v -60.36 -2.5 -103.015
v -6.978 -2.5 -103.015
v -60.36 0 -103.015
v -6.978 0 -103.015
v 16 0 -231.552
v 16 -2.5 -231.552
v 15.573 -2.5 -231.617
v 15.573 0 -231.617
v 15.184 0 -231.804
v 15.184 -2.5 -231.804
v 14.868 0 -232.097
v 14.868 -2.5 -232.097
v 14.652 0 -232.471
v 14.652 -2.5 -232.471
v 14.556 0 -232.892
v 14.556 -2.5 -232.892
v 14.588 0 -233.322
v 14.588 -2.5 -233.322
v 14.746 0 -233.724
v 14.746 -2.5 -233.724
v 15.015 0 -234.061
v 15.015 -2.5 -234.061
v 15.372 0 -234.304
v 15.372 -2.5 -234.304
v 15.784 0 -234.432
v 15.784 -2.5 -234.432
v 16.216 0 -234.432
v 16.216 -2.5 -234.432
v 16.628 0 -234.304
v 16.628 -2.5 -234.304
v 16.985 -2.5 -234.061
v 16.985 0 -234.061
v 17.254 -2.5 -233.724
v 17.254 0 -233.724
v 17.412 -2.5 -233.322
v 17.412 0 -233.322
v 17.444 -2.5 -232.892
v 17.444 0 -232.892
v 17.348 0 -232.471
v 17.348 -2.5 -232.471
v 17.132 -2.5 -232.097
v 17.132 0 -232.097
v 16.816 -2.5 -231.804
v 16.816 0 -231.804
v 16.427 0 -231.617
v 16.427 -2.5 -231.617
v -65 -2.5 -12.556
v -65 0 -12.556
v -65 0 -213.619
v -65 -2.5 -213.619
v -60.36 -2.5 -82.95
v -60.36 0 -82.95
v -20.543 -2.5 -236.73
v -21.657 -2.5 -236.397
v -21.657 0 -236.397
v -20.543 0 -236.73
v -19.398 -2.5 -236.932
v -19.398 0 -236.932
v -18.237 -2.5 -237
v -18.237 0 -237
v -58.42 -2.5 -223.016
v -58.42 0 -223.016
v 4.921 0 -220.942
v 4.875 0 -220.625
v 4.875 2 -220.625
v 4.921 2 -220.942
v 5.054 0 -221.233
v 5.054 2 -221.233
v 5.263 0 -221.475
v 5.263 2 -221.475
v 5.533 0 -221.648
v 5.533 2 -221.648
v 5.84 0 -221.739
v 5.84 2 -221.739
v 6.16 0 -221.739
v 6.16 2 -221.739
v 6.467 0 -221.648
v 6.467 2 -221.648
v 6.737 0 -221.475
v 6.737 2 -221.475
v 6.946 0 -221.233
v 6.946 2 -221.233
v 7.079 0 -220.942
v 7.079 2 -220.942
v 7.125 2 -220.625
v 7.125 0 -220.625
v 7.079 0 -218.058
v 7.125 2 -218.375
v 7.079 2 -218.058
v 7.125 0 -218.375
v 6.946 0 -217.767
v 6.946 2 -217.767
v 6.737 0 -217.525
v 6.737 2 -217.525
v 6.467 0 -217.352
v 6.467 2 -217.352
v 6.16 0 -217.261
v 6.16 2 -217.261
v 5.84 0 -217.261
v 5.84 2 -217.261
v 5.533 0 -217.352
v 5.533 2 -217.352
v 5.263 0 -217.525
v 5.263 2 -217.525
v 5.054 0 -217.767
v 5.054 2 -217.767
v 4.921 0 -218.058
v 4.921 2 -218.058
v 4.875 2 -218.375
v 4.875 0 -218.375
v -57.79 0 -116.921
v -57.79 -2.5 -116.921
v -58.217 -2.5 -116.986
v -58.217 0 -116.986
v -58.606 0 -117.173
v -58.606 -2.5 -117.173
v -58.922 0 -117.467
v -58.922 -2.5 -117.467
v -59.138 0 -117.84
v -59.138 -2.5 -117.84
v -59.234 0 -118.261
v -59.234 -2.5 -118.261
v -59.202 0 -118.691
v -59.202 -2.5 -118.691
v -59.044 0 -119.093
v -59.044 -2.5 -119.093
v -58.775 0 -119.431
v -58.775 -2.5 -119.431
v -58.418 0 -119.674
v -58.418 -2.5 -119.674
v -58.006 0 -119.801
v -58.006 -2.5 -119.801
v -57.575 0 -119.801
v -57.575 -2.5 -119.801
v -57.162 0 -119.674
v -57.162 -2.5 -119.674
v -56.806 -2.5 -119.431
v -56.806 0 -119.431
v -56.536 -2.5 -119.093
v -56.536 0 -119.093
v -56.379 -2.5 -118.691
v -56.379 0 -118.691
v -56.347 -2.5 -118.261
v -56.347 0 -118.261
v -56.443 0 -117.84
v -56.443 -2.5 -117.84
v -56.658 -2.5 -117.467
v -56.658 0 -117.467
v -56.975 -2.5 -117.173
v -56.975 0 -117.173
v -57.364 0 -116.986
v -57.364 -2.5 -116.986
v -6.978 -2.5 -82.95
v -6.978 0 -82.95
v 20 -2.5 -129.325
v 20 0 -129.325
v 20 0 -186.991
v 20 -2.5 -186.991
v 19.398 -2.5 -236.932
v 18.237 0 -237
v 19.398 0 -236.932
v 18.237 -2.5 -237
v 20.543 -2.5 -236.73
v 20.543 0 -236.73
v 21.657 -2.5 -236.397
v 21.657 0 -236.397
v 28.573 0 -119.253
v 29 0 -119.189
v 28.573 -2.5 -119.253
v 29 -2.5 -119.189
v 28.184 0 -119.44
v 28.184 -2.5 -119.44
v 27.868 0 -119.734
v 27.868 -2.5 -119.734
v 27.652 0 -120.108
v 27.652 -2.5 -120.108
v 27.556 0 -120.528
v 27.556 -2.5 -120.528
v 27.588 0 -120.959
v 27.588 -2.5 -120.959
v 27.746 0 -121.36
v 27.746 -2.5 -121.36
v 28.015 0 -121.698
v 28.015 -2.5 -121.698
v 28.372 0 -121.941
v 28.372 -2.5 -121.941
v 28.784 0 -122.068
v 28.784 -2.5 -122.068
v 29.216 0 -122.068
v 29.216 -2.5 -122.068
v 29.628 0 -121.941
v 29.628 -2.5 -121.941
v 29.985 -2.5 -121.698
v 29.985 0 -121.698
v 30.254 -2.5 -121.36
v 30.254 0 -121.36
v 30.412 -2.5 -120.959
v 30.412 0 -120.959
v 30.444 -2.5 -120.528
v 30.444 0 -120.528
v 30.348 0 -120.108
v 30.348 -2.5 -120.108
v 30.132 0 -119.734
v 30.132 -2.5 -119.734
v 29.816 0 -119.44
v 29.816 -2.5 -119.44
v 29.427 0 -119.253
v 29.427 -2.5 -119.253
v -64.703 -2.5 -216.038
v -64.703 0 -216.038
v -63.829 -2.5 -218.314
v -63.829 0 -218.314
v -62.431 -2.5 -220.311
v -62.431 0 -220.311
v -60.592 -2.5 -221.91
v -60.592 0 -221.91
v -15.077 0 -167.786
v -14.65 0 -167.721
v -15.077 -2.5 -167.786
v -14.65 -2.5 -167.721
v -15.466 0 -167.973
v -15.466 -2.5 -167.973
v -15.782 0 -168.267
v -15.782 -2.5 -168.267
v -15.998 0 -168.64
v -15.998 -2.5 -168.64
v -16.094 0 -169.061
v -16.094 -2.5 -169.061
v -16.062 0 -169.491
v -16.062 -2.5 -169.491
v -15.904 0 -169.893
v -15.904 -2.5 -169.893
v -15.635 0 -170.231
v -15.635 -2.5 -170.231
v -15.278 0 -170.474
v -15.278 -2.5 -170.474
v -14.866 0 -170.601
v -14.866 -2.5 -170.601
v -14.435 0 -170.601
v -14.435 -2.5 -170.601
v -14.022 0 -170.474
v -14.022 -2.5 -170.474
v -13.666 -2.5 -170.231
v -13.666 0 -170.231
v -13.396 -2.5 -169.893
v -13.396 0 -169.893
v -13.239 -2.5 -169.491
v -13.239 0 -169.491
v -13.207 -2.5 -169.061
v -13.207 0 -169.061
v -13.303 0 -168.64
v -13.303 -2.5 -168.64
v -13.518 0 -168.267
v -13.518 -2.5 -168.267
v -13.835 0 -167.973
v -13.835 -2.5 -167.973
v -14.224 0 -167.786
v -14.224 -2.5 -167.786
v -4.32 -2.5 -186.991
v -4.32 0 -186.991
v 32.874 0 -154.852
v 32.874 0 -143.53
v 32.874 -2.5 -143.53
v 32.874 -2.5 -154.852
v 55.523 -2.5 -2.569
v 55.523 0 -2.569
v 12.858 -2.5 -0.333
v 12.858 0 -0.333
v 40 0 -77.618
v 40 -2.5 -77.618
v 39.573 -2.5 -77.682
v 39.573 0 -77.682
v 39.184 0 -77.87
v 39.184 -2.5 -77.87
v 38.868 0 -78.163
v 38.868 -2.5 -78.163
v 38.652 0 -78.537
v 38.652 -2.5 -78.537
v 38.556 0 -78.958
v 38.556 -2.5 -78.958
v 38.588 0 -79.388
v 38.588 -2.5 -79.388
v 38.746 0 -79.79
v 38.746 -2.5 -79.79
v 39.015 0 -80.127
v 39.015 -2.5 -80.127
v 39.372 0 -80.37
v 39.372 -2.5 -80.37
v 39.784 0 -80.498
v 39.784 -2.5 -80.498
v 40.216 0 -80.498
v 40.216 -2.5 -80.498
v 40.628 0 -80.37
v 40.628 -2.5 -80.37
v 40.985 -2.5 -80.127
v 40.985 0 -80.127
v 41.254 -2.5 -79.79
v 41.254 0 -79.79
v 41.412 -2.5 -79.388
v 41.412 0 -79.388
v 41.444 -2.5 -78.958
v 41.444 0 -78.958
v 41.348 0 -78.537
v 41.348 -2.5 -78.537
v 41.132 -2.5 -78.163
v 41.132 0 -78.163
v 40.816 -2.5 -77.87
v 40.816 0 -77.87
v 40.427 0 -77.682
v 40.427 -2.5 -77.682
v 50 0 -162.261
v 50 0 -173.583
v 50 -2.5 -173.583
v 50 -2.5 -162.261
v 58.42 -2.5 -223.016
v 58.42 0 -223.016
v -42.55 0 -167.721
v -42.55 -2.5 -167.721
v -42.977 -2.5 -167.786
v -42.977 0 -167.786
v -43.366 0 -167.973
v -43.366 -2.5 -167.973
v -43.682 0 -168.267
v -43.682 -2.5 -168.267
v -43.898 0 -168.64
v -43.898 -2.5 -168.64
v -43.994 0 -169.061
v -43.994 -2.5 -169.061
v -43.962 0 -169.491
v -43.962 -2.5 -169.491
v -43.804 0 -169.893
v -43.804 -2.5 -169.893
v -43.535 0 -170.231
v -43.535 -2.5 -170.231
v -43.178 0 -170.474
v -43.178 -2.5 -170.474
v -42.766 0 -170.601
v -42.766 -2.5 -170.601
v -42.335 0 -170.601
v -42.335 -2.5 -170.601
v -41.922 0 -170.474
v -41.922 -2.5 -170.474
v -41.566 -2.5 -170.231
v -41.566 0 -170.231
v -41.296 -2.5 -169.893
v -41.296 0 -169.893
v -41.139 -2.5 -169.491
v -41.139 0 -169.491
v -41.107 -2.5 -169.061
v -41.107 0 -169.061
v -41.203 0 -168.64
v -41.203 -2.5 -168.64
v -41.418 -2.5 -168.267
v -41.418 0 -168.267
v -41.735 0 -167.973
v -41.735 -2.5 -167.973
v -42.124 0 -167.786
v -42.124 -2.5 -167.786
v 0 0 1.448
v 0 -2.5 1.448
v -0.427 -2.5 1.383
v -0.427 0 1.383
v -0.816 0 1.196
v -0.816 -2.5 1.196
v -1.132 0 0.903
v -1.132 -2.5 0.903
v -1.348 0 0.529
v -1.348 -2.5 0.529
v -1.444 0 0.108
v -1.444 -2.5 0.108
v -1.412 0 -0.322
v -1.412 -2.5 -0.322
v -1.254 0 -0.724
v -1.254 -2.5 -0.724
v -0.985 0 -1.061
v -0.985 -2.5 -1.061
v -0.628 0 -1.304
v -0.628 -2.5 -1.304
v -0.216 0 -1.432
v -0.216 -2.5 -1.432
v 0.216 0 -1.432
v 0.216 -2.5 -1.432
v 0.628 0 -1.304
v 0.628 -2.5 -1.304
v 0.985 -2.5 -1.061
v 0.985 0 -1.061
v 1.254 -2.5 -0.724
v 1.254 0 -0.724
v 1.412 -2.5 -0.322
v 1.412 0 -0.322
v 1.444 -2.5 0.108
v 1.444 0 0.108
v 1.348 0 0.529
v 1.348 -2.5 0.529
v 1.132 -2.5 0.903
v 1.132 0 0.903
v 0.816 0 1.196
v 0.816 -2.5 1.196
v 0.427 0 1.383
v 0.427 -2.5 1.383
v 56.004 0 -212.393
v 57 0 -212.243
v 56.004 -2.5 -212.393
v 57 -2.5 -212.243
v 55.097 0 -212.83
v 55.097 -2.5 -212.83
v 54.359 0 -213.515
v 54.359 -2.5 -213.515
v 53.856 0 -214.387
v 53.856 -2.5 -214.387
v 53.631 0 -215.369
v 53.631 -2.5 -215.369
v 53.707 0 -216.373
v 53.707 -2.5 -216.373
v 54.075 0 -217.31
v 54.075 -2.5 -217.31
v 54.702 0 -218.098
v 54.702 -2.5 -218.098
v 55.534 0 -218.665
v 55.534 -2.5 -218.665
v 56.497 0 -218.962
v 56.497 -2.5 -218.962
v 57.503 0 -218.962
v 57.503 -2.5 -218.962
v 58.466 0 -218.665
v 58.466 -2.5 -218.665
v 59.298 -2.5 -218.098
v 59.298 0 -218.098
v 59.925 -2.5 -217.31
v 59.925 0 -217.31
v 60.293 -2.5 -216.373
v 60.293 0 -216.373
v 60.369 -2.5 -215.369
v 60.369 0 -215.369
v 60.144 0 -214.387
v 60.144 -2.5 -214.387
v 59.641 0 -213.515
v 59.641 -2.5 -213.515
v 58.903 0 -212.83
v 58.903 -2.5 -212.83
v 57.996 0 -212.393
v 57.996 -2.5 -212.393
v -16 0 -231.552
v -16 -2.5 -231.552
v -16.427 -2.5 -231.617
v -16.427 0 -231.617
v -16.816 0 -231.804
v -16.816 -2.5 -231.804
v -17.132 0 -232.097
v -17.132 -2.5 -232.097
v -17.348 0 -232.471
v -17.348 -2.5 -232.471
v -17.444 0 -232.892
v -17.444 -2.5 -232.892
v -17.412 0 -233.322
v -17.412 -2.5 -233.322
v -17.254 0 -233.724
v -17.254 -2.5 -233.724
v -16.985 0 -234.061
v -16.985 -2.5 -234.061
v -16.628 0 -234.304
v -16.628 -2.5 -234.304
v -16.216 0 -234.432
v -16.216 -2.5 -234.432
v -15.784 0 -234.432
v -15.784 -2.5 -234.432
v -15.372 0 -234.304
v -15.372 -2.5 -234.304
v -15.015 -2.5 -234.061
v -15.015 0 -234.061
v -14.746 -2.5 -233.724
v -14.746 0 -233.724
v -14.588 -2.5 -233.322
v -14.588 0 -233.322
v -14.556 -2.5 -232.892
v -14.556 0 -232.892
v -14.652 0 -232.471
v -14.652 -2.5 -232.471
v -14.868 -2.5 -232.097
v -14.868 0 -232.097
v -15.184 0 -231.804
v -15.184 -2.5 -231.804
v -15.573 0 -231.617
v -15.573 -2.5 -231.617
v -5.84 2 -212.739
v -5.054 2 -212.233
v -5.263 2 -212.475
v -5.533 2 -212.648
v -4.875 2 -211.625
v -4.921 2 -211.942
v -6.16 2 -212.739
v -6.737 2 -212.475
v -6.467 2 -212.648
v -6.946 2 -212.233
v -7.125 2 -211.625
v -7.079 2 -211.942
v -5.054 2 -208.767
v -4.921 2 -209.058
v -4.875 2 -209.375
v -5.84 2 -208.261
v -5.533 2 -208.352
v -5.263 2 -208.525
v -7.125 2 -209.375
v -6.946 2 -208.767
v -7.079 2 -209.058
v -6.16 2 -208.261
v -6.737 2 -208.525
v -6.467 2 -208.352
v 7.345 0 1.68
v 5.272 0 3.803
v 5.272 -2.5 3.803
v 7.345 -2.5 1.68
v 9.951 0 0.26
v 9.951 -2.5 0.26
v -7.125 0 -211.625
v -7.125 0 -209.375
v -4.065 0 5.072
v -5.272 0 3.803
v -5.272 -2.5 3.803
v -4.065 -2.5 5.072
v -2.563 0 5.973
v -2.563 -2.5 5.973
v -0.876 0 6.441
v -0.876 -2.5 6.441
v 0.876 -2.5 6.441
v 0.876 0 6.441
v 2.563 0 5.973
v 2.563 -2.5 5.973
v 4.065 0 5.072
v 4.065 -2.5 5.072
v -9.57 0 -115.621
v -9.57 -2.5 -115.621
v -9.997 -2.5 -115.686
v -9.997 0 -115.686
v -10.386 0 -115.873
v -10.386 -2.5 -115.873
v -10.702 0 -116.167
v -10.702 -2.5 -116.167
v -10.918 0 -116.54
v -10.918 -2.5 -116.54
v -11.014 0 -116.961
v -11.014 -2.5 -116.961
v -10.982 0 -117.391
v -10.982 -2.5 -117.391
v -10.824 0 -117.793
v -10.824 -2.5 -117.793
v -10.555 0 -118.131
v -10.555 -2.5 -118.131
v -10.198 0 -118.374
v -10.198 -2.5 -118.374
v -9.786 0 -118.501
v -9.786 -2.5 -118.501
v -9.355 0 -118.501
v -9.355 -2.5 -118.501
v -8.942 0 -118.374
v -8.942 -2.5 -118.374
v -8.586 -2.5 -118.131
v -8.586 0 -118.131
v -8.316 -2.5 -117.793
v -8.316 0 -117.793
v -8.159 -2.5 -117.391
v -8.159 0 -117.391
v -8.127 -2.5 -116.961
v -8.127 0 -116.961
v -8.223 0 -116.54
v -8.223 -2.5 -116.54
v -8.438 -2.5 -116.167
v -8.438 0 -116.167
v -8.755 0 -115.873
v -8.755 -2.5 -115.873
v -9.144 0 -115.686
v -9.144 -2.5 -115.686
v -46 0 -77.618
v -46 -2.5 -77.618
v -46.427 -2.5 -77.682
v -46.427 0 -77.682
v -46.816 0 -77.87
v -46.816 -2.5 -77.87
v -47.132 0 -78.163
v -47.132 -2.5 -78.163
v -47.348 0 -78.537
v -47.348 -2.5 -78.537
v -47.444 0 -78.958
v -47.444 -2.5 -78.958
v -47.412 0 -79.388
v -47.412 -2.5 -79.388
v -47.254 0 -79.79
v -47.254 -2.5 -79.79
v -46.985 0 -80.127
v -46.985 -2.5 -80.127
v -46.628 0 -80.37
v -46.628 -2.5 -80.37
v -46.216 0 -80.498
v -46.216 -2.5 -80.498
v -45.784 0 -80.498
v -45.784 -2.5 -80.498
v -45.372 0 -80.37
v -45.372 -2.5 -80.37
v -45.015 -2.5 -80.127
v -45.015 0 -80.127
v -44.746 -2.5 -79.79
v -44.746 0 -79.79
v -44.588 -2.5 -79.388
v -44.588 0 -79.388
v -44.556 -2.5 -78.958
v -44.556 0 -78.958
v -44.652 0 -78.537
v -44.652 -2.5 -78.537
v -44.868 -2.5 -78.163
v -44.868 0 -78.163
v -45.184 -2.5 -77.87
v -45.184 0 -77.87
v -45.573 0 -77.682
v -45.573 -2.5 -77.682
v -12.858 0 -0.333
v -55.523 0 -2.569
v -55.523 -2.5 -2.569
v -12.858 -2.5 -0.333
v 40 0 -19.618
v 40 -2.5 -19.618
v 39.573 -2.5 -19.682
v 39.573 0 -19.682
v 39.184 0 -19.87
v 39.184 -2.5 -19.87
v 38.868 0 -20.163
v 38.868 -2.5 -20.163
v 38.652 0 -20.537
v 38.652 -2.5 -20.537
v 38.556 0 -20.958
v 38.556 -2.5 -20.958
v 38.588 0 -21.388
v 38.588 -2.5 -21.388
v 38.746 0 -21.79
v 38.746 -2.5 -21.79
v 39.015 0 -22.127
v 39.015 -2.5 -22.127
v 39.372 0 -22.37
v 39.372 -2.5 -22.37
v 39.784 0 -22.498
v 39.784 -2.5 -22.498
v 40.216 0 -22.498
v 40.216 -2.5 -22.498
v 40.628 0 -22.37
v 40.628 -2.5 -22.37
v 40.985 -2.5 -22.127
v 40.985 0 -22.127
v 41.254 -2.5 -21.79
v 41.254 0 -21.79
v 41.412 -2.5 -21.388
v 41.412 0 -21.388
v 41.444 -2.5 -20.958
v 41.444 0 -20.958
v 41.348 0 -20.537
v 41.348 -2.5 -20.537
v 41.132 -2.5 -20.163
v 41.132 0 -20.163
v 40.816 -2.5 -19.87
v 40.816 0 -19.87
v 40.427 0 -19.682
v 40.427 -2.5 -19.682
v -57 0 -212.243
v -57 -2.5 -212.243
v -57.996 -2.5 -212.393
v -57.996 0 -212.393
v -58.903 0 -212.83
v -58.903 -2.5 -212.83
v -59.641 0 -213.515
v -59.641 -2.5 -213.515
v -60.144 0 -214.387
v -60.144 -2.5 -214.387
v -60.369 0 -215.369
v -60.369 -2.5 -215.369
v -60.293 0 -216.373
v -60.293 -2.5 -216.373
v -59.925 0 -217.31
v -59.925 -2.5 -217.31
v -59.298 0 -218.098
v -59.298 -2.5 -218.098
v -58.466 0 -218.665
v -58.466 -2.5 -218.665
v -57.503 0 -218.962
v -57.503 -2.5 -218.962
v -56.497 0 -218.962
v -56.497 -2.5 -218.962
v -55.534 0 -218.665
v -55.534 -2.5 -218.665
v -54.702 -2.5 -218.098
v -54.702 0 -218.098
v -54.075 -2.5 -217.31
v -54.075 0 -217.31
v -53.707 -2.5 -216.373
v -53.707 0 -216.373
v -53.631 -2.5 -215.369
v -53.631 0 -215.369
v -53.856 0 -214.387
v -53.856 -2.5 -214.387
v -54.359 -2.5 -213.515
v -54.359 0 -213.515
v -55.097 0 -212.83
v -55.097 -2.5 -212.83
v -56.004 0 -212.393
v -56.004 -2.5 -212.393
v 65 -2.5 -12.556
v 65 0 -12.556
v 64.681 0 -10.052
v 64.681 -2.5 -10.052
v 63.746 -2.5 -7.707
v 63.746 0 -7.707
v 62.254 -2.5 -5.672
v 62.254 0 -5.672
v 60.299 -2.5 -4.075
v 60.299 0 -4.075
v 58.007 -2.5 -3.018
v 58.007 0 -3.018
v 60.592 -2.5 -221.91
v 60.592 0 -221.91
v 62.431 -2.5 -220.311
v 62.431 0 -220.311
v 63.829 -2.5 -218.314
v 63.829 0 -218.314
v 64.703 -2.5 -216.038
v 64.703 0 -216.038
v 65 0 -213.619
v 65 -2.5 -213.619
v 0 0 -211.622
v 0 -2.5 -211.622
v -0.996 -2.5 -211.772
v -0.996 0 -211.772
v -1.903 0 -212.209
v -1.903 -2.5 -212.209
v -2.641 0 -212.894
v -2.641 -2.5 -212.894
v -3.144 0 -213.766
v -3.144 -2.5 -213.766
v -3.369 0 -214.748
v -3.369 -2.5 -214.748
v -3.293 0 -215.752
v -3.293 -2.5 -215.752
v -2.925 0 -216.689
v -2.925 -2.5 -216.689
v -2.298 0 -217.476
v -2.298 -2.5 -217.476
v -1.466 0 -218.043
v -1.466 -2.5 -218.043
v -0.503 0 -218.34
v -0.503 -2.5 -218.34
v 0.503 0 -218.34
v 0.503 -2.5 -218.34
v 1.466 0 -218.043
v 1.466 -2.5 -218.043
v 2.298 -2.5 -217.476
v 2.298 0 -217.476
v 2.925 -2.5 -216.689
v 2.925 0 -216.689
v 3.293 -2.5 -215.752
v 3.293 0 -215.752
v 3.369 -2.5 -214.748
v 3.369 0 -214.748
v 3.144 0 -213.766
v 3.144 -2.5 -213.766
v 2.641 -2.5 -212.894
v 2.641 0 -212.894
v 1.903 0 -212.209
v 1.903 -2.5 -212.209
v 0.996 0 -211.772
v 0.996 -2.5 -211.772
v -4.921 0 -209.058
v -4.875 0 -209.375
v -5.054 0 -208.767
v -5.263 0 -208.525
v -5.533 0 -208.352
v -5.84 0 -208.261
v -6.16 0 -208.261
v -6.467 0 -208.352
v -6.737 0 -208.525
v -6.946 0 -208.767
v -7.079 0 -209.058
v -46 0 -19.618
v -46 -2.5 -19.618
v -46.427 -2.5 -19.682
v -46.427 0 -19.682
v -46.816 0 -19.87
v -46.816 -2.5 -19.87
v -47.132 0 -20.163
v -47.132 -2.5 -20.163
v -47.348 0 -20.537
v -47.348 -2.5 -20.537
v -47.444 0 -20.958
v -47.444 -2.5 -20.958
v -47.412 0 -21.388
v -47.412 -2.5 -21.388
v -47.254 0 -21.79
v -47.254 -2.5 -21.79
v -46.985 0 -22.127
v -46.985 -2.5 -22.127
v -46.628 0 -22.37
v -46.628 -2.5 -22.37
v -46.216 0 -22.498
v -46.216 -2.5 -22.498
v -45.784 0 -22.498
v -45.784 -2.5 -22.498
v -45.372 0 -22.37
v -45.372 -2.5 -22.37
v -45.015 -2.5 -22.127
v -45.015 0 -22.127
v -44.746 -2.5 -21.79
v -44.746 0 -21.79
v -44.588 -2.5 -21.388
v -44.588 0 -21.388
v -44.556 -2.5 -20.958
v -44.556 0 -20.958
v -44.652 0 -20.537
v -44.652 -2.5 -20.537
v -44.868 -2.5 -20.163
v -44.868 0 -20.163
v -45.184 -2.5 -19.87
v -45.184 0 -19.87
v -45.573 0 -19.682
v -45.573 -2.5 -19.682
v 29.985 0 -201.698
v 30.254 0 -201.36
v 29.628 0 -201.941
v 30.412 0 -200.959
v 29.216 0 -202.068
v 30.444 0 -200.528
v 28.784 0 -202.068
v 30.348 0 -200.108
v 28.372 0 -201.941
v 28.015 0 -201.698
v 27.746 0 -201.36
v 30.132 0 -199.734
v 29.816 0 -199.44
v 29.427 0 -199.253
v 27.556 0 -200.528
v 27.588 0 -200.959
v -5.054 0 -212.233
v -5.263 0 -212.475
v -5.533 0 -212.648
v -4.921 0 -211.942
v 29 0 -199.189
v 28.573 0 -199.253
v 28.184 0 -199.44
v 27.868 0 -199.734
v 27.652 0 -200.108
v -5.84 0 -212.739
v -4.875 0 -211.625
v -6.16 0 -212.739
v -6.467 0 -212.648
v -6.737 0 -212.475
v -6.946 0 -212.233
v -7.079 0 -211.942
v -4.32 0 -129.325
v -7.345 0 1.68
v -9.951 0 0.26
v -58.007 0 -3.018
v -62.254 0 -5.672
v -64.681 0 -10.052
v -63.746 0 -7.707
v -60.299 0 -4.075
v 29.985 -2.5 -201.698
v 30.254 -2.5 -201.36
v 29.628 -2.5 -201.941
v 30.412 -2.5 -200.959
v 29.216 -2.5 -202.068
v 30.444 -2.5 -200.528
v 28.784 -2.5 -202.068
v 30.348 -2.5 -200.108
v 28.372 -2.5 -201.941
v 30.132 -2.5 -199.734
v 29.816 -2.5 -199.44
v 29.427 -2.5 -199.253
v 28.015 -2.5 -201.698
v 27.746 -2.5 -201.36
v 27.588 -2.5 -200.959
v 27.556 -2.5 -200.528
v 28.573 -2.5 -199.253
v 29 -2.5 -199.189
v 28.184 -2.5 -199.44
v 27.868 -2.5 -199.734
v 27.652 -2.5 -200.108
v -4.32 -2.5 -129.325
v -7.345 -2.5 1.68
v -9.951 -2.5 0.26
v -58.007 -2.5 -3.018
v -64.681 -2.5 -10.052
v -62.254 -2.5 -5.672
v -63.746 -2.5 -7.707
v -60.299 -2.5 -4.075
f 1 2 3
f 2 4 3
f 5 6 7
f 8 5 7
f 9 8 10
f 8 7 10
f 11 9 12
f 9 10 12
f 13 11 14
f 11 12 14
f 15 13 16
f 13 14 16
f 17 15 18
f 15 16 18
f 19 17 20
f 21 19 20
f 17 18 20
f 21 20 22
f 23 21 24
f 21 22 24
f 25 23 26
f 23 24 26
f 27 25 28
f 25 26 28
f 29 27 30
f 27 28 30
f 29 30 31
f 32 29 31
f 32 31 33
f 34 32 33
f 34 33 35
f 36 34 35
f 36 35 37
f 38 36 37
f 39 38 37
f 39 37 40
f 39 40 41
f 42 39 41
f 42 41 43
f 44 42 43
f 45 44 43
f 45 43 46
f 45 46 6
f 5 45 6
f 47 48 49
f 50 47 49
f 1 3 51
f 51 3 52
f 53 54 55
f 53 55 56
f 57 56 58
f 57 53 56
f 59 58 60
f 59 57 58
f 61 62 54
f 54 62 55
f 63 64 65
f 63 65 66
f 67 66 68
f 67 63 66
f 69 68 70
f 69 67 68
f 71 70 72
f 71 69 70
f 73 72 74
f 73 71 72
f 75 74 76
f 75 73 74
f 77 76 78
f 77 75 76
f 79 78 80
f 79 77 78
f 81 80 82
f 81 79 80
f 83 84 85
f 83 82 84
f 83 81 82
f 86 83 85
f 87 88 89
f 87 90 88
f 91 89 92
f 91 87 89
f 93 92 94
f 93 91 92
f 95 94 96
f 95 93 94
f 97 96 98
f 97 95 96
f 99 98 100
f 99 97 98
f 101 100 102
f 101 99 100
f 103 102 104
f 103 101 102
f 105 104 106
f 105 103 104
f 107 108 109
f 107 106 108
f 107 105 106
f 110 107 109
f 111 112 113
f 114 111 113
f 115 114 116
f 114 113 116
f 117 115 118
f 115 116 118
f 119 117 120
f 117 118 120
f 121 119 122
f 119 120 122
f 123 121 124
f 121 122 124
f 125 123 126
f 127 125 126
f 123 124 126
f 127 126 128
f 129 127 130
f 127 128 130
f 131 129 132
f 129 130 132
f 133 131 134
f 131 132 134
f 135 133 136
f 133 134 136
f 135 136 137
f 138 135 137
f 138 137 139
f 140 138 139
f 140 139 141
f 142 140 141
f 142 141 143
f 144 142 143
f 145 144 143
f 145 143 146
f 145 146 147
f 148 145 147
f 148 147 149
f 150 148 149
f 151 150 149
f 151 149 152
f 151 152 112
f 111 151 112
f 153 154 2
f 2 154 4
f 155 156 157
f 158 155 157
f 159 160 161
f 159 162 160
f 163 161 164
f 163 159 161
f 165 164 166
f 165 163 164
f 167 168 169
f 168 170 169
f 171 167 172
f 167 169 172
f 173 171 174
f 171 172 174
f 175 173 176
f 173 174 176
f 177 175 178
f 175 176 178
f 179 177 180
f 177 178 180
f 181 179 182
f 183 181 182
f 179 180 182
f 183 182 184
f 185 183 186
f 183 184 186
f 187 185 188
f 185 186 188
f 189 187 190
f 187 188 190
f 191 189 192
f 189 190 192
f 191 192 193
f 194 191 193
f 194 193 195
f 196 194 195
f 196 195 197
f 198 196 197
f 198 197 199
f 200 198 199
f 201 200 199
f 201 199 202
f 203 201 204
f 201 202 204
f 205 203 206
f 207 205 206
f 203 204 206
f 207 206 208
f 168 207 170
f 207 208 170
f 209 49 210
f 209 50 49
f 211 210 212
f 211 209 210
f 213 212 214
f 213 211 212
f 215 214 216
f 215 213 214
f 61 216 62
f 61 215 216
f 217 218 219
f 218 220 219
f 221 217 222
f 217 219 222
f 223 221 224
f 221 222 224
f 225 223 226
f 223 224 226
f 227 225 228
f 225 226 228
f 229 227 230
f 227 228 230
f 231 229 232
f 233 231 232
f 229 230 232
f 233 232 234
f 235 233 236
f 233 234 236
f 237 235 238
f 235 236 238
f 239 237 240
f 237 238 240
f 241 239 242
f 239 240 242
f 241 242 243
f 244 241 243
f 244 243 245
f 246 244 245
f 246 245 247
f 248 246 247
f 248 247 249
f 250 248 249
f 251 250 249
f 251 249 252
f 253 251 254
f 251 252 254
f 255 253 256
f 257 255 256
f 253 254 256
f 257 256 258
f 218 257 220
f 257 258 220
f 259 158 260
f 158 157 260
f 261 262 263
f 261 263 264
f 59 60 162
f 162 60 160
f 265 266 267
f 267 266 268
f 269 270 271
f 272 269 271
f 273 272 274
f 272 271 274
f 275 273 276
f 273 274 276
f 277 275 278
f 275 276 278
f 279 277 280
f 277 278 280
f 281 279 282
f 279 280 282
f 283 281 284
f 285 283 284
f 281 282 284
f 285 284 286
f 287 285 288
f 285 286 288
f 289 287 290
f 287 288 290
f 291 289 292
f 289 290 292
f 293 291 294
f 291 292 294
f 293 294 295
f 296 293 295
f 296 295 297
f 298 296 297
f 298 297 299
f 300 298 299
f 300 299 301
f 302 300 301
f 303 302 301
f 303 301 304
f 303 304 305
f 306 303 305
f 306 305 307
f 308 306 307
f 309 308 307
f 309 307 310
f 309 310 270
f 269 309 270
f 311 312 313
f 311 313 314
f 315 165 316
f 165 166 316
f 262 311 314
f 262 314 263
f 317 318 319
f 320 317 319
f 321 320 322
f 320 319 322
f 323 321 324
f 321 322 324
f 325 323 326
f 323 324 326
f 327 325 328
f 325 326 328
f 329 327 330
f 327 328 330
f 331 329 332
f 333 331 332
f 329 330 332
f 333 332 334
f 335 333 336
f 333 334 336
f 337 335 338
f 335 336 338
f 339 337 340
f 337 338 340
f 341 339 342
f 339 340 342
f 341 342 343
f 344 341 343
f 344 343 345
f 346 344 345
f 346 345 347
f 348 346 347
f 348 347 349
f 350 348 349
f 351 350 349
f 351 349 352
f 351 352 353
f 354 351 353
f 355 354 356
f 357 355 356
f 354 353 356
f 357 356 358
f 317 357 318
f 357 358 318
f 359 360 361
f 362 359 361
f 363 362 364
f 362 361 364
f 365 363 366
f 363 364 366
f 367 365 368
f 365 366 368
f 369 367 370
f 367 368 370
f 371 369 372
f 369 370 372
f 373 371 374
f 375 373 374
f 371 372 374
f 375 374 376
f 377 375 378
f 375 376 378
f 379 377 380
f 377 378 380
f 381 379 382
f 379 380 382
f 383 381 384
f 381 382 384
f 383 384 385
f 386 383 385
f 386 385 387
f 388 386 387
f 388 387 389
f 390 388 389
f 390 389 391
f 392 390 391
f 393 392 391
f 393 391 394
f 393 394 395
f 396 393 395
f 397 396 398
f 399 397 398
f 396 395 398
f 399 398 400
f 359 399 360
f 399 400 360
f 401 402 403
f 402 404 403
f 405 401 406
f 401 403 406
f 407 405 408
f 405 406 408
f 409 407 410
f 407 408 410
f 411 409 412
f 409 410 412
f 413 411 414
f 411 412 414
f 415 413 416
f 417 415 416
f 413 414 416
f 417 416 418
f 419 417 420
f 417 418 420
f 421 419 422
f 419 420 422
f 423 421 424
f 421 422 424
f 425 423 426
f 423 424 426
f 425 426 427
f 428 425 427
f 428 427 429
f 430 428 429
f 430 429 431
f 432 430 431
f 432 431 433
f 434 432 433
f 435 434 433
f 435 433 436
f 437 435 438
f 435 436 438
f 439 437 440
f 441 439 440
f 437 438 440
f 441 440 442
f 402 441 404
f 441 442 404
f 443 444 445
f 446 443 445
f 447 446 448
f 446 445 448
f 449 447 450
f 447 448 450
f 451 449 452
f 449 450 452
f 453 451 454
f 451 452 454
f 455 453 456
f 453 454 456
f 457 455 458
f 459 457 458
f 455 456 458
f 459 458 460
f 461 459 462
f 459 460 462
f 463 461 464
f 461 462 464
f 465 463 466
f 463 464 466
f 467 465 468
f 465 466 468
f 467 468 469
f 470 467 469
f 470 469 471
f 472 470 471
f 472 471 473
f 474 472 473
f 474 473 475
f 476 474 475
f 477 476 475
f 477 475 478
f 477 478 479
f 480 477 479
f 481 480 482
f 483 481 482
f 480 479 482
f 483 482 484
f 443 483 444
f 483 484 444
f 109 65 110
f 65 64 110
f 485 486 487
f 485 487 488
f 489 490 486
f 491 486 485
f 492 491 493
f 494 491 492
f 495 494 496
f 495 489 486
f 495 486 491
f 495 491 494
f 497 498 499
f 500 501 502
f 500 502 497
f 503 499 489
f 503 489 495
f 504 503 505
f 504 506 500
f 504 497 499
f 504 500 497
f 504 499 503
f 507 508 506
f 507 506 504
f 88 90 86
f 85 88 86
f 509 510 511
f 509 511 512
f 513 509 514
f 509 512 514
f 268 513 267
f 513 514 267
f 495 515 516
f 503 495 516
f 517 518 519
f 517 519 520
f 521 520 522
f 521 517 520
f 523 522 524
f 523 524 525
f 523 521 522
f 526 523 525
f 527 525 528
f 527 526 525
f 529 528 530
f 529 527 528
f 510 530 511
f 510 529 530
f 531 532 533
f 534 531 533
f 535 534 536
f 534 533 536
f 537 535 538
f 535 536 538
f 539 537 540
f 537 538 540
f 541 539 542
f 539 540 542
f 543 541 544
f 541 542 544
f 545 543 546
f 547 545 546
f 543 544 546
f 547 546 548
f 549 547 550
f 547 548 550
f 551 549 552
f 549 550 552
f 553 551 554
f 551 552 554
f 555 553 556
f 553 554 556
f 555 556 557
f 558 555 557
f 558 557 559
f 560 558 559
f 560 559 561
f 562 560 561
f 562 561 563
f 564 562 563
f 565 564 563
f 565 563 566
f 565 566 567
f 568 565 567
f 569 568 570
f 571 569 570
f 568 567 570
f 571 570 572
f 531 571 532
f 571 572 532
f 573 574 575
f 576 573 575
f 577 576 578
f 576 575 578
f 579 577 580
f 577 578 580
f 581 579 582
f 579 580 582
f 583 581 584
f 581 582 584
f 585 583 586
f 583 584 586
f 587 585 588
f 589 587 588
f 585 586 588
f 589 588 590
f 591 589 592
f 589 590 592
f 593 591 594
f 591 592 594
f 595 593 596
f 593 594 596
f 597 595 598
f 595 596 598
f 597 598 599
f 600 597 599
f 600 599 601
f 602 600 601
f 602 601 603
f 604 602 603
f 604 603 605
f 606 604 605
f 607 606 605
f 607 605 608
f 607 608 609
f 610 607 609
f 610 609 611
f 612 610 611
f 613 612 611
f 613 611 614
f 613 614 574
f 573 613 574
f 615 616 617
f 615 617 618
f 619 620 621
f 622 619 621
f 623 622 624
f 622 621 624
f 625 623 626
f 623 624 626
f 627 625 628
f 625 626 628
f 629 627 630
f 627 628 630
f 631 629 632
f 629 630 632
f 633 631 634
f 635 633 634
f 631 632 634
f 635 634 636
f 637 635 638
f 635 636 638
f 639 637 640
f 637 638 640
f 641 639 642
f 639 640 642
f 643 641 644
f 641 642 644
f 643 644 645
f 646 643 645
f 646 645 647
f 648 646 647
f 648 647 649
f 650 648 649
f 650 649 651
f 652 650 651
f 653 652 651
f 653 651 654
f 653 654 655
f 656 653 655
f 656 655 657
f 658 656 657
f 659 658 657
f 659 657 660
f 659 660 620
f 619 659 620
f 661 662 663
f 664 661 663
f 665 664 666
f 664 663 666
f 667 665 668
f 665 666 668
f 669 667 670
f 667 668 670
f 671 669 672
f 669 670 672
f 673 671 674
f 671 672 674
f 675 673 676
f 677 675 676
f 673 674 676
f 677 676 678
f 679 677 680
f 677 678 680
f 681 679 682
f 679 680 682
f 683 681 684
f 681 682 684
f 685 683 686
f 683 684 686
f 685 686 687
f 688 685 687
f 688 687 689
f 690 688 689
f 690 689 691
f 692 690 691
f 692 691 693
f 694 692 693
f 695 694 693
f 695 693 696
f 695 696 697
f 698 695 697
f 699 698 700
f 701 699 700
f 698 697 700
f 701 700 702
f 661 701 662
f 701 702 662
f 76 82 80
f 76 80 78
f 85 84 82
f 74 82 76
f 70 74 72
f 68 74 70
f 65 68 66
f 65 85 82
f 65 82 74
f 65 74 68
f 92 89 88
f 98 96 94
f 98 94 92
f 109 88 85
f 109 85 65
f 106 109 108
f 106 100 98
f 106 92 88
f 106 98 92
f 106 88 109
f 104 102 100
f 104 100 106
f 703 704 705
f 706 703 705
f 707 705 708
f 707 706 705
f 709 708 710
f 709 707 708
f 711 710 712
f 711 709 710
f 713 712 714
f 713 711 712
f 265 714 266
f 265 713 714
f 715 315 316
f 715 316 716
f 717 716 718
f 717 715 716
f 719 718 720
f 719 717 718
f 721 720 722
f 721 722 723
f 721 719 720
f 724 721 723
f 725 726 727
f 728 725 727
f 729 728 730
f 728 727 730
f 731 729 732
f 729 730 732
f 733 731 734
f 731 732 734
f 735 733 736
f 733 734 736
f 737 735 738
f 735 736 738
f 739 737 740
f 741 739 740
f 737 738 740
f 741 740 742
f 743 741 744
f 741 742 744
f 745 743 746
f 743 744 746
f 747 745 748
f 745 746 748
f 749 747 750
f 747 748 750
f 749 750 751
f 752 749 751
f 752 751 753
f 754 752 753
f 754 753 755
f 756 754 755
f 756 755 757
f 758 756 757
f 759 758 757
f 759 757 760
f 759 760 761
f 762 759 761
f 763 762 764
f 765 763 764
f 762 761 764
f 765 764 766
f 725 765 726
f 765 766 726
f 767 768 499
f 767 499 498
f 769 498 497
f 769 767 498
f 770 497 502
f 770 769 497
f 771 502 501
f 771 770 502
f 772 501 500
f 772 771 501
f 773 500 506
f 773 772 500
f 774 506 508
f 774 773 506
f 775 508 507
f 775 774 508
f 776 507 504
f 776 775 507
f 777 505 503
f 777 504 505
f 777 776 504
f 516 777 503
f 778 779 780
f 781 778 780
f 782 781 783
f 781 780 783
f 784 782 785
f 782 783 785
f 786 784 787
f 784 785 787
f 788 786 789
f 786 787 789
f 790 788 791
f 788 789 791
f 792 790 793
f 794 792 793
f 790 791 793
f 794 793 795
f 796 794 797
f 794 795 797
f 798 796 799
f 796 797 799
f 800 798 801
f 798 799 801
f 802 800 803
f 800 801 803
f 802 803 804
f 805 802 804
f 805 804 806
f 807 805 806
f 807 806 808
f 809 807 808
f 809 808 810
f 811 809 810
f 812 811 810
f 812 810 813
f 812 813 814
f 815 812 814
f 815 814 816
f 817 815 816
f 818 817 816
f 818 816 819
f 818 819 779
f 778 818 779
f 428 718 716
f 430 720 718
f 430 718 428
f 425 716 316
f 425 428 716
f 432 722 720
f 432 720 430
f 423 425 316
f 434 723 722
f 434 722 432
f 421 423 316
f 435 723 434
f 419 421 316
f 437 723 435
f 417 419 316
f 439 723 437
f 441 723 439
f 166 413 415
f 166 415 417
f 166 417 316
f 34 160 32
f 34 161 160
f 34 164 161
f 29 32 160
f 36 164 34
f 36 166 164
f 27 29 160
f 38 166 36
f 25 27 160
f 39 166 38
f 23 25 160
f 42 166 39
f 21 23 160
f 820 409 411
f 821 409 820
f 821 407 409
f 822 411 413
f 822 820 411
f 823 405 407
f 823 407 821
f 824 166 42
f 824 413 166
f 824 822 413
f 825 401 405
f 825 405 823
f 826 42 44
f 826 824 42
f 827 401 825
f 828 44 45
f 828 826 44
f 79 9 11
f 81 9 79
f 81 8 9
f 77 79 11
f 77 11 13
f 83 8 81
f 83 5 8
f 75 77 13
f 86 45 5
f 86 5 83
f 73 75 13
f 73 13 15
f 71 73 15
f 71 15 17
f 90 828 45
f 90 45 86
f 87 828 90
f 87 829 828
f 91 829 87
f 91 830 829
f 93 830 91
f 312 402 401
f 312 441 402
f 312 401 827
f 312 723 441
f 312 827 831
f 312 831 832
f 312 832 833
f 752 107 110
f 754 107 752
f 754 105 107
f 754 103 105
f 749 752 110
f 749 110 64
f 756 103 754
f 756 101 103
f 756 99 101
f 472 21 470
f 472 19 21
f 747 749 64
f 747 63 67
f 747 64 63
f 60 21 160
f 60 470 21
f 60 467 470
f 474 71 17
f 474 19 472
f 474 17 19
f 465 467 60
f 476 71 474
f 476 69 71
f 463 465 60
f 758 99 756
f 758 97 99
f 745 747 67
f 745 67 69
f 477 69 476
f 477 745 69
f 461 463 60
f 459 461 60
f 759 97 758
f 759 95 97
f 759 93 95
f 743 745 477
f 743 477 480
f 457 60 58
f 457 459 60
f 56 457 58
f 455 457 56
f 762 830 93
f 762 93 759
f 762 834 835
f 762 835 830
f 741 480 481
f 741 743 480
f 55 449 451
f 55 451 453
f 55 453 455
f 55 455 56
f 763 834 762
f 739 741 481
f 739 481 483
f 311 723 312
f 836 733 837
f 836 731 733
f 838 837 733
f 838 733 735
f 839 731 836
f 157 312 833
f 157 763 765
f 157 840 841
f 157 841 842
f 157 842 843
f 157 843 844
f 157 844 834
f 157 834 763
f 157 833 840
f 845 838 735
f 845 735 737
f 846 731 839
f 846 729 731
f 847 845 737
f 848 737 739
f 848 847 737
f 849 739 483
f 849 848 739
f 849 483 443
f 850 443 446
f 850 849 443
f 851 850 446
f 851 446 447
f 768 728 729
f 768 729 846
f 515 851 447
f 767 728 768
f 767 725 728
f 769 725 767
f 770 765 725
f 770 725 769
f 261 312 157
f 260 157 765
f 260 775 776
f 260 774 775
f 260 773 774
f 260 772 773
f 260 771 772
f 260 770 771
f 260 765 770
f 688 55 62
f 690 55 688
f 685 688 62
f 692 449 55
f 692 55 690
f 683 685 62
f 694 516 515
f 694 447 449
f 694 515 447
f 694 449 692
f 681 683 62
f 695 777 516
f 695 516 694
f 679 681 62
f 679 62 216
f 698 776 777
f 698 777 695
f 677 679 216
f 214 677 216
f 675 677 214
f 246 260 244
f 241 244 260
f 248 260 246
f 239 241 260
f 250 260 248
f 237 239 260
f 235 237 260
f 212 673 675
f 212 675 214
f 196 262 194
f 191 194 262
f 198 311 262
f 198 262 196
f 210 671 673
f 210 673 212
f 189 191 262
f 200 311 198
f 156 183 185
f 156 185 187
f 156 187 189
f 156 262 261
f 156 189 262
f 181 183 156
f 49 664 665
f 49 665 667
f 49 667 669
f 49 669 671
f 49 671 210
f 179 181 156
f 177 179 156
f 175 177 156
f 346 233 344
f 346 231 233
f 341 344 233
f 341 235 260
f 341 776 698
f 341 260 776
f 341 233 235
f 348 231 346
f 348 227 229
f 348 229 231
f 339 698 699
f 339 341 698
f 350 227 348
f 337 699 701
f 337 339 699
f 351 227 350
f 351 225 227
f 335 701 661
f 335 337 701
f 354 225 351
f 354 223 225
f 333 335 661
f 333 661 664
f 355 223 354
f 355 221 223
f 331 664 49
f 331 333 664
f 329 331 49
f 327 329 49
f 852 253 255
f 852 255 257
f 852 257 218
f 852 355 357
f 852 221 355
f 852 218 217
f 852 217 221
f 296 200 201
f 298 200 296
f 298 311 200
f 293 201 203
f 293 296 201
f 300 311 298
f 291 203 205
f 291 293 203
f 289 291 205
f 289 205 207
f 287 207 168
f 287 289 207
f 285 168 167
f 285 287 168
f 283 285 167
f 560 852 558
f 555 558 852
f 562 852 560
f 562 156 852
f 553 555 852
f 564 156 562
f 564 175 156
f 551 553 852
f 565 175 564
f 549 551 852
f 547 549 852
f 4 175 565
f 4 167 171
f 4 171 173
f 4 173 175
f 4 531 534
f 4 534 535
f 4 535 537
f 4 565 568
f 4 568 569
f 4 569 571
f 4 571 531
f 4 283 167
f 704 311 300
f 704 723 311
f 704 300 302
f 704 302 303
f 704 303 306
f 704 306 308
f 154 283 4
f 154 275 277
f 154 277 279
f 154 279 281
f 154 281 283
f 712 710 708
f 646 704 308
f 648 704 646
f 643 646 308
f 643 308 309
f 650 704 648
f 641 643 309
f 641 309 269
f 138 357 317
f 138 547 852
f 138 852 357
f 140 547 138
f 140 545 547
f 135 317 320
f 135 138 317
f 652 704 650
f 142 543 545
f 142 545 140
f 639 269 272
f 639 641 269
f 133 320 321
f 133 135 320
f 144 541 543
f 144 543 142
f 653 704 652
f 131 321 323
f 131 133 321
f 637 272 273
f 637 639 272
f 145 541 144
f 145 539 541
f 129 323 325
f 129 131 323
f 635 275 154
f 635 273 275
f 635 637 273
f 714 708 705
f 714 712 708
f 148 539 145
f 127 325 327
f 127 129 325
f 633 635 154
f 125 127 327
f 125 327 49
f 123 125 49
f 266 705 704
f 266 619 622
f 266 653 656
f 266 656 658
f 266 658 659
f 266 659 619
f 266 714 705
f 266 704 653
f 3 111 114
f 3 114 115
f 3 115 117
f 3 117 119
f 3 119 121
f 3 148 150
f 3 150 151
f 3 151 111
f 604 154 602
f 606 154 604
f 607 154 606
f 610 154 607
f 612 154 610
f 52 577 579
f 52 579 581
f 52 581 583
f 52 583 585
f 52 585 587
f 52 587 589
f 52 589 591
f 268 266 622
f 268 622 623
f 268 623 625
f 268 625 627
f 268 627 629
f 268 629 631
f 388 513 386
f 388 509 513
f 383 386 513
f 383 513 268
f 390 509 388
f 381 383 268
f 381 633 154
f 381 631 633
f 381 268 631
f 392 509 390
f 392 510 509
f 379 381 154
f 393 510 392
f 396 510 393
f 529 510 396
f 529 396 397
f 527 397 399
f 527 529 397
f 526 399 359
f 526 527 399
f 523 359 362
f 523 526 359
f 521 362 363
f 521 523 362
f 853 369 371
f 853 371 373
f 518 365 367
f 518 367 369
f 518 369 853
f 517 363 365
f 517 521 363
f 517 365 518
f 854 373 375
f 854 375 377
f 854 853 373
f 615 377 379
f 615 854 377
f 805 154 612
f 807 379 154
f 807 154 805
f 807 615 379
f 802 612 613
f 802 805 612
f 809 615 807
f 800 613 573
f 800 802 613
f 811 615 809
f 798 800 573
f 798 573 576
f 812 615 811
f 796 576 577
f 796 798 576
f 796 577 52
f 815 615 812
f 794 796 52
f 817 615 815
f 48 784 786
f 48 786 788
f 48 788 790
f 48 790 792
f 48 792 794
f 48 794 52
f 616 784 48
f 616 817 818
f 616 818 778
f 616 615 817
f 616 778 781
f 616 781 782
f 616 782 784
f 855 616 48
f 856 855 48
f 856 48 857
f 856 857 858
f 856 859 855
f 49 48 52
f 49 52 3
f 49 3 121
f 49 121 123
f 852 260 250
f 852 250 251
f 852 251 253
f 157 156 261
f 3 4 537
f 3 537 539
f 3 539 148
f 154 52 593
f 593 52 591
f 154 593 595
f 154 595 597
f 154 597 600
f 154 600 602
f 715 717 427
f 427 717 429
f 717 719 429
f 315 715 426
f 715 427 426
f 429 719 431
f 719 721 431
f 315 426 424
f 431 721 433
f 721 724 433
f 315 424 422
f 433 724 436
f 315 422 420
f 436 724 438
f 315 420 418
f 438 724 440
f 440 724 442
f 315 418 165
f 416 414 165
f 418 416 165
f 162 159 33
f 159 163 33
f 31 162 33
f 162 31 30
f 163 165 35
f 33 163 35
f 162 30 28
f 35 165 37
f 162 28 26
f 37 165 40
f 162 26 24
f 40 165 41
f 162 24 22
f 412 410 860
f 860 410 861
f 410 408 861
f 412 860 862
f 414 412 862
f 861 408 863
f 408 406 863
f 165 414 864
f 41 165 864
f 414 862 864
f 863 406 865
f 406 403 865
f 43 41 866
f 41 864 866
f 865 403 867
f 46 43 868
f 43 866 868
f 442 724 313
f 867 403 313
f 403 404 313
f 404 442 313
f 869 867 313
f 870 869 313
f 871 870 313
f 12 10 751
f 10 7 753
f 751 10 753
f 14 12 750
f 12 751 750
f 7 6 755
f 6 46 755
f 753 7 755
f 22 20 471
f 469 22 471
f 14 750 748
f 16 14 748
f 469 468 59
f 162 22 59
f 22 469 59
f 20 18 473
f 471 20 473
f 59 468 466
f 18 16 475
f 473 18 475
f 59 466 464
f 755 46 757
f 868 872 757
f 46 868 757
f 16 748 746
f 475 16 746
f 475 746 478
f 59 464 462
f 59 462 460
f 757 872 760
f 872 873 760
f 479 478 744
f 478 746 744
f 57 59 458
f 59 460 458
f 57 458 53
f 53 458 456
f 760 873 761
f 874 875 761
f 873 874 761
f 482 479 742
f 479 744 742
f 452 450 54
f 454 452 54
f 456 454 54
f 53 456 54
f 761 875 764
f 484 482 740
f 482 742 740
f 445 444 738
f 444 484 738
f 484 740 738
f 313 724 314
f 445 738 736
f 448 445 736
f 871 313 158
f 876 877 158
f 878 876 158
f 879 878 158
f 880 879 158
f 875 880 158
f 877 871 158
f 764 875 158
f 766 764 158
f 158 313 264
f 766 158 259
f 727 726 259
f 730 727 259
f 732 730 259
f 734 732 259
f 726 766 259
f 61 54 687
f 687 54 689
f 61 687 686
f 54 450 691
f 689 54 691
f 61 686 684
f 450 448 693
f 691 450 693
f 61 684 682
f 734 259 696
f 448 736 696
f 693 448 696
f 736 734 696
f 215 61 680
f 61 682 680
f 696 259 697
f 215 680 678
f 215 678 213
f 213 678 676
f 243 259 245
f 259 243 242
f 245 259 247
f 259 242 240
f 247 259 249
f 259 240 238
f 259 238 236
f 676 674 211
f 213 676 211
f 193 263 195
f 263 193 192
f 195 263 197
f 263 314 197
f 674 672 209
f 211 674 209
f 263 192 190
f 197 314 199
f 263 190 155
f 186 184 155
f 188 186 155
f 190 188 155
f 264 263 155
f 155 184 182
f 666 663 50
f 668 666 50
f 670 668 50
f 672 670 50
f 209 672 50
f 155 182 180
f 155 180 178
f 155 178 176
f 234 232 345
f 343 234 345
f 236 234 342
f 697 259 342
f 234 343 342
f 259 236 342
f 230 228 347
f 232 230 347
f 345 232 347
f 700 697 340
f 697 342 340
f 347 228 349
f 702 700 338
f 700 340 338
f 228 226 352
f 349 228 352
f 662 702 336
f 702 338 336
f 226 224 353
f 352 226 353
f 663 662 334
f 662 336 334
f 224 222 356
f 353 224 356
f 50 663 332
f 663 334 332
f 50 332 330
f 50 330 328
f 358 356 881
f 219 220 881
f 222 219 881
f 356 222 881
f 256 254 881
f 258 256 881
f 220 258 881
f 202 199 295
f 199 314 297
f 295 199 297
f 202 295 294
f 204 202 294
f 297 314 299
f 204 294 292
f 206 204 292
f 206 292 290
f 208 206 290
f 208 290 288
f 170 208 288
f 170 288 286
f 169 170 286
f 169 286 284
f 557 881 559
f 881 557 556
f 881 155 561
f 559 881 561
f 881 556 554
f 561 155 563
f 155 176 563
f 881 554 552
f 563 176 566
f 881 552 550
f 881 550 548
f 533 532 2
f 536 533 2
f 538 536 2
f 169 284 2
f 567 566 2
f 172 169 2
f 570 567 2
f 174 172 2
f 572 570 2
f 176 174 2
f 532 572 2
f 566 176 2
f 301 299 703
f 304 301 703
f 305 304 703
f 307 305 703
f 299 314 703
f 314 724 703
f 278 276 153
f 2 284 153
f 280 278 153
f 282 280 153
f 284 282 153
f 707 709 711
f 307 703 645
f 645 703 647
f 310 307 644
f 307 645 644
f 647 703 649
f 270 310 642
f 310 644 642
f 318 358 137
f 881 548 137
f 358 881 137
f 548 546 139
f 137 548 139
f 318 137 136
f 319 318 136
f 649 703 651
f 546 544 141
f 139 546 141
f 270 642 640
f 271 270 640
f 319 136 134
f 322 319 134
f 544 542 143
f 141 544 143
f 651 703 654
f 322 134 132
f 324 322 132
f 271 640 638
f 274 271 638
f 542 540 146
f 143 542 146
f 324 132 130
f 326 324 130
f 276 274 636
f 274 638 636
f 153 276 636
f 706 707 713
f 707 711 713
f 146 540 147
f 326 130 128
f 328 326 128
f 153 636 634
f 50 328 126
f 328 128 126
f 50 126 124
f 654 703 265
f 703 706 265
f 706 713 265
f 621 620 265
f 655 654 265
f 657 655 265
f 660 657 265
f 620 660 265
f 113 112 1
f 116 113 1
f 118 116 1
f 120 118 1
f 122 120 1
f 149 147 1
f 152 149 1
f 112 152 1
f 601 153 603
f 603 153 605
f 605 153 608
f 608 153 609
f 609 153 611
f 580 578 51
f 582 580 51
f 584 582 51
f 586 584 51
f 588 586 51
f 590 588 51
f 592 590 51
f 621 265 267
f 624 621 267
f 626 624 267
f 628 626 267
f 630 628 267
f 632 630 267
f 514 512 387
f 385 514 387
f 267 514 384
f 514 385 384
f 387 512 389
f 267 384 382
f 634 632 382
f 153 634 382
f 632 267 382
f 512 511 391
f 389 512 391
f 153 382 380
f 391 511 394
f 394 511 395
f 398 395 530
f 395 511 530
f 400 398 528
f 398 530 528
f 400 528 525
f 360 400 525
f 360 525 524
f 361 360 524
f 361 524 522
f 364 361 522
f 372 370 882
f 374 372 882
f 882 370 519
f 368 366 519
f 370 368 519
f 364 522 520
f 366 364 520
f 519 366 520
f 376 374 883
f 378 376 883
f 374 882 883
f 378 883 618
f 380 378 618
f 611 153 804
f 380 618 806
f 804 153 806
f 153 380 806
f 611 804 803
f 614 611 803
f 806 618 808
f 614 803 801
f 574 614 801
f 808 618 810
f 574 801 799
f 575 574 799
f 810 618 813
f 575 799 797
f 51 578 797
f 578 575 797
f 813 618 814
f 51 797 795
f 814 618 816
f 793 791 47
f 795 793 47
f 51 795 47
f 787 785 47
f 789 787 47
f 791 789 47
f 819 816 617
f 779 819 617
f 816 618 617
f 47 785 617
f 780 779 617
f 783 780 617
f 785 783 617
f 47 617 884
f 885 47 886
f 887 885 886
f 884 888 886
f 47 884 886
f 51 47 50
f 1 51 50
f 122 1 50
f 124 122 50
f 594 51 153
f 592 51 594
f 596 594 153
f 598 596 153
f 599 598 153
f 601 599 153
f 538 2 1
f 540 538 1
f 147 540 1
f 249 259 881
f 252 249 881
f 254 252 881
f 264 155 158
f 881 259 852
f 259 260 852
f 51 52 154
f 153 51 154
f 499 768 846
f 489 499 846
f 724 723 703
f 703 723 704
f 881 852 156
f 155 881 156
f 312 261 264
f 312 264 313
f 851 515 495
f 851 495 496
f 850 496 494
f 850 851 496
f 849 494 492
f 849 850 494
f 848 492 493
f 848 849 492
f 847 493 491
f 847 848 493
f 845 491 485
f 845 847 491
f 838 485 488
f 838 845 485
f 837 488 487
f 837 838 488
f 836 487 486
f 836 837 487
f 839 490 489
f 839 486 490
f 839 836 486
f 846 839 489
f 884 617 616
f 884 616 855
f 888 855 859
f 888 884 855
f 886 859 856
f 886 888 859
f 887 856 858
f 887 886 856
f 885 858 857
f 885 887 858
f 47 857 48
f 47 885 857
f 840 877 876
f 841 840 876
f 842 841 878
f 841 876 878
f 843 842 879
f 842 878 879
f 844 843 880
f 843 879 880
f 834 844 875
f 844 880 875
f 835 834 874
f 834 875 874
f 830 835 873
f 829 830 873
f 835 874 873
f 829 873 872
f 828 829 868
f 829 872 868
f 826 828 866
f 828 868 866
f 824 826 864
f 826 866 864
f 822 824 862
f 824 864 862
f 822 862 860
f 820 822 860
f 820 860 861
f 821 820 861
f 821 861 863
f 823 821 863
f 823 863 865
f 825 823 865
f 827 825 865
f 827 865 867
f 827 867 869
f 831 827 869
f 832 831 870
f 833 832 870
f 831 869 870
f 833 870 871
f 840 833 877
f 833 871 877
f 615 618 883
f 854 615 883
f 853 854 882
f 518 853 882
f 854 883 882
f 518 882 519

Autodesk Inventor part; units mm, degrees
ref_plane "YZ Plane" through (0, 0, 0) normal (1, 0, 0) x (0, 1, 0)
ref_plane "XZ Plane" through (0, 0, 0) normal (0, 1, 0) x (-1, 0, 0)
ref_plane "XY Plane" through (0, 0, 0) normal (0, 0, 1) x (1, 0, 0)
sketch "Sketch2" plane through (0, 0, 0) normal (0, 1, 0) x (-1, 0, 0)
  line L0 (60, -21.0659) -> (-26, -21.0659) construction
  line L1 (-26, -21.0659) -> (-26, -79.0659) construction
  line L2 (-26, -79.0659) -> (60, -79.0659) construction
  line L3 (60, -79.0659) -> (60, -21.0659) construction
  line L4 (-41.5, -22.5659) -> (-60.5, -22.5659) construction
  line L5 (-60.5, -22.5659) -> (-60.5, -78.5659) construction
  line L6 (-60.5, -78.5659) -> (-41.5, -78.5659) construction
  line L7 (-41.5, -78.5659) -> (-41.5, -22.5659) construction
  line L8 (46, -21.0659) -> (-40, -21.0659) construction
  line L9 (-40, -21.0659) -> (-40, -79.0659) construction
  line L10 (-40, -79.0659) -> (46, -79.0659) construction
  line L11 (46, -79.0659) -> (46, -21.0659) construction
  line L12 (-29, -120.6366) -> (-29, -200.6366) construction
  line L13 (65, -3.0659) -> (65, -220.6213)
  line L14 (65, -220.6213) -> (20, -237)
  line L15 (20, -237) -> (-20, -237)
  line L16 (-20, -237) -> (-65, -220.6213)
  line L17 (-65, -220.6213) -> (-65, -3.0659)
  line L18 (65, -3.0659) -> (6.5, 0)
  line L19 (-65, -3.0659) -> (-6.5, 0)
  arc A0 (6.5, 0) -> (-6.5, 0) centre (0, 0) ccw
  line L20 (16, -233) -> (-16, -233) construction
  line L21 (6.5, 0) -> (-6.5, 0) construction
  line L22 (-32.8737, -143.5299) -> (-32.8737, -154.8521)
  line L23 (-32.8737, -154.8521) -> (-50, -173.5831)
  line L24 (-50, -173.5831) -> (-50, -162.2608)
  line L25 (-50, -162.2608) -> (-32.8737, -143.5299)
  line L26 (4.3202, -129.3254) -> (-20, -129.3254)
  line L27 (-20, -129.3254) -> (-20, -186.991)
  line L28 (-20, -186.991) -> (4.3202, -186.991)
  line L29 (4.3202, -186.991) -> (4.3202, -129.3254)
  line L30 (64, -4.0659) -> (-36, -4.0659) construction
  line L31 (-36, -4.0659) -> (-36, -83.0659) construction
  line L32 (-36, -83.0659) -> (64, -83.0659) construction
  line L33 (64, -83.0659) -> (64, -4.0659) construction
  line L34 (50, -4.0659) -> (-50, -4.0659) construction
  line L35 (-50, -4.0659) -> (-50, -83.0659) construction
  line L36 (-50, -83.0659) -> (50, -83.0659) construction
  line L37 (50, -83.0659) -> (50, -4.0659) construction
  line L38 (57, -215.6213) -> (-57, -215.6213) construction
  line L39 (42.5503, -169.1692) -> (14.6503, -169.1692) construction
  line L40 (60.3703, -103.0992) -> (7.0303, -103.0992) construction
  line L41 (7.0303, -103.0992) -> (7.0303, -204.6992) construction
  line L42 (7.0303, -204.6992) -> (60.3703, -204.6992) construction
  line L43 (60.3703, -204.6992) -> (60.3703, -103.0992) construction
  line L44 (60.3601, -82.95) -> (6.9778, -82.95)
  line L45 (6.9778, -82.95) -> (6.9778, -103.0146)
  line L46 (6.9778, -103.0146) -> (60.3601, -103.0146)
  line L47 (60.3601, -103.0146) -> (60.3601, -82.95)
  line L48 (6, -209.375) -> (6, -211.625) construction
  line L49 (4.875, -209.375) -> (4.875, -211.625)
  line L50 (7.125, -211.625) -> (7.125, -209.375)
  arc A1 (7.125, -209.375) -> (4.875, -209.375) centre (6, -209.375) ccw
  arc A2 (4.875, -211.625) -> (7.125, -211.625) centre (6, -211.625) ccw
  line L51 (-6, -218.375) -> (-6, -220.625) construction
  line L52 (-7.125, -218.375) -> (-7.125, -220.625)
  line L53 (-4.875, -220.625) -> (-4.875, -218.375)
  arc A3 (-4.875, -218.375) -> (-7.125, -218.375) centre (-6, -218.375) ccw
  arc A4 (-7.125, -220.625) -> (-4.875, -220.625) centre (-6, -220.625) ccw
  point P0 (0, -215)
  point P1 (57.7903, -118.3692)
  point P2 (9.5703, -117.0692)
  point P3 (6, -210.5)
  point P4 (-6, -219.5)
  dimension "d0" = 130
  dimension "d1" = 32
  dimension "d4" = 65
  dimension "d5" = 0
  dimension "d6" = 6.5
  dimension "d7" = 93
  dimension "d8" = 93
  dimension "d9" = 4
  dimension "d11" = 237
  dimension "d12" = 160
  dimension "d14" = 86
  dimension "d15" = 86
  dimension "d16" = 58
  dimension "d17" = 4
  dimension "d18" = 4
  dimension "d19" = 4
  dimension "d20" = 100
  dimension "d21" = 100
  dimension "d22" = 79
  dimension "d23" = 50
  dimension "d24" = 19
  dimension "d25" = 56
  dimension "d26" = 15.5
  dimension "d27" = 1.5
  dimension "d28" = 40
  dimension "d29" = 20
  dimension "d30" = 4
  dimension "d31" = 160
  dimension "d32" = 80
  dimension "d33" = 36
  dimension "d34" = 0
  dimension "d35" = 22
  dimension "d36" = 1
  dimension "d37" = 1
  dimension "d38" = 27.9
  dimension "d39" = 1.3
  dimension "d40" = 50.8
  dimension "d41" = 15.24
  dimension "d42" = 5.08
  dimension "d43" = 13.97
  dimension "d44" = 101.6
  dimension "d45" = 2.54
  dimension "d46" = 53.34
  dimension "d78" = 8
  dimension "d79" = 8
  dimension "d80" = 5
  dimension "d81" = 2.25
  dimension "d82" = 2.25
  dimension "d83" = 2.25
  dimension "d84" = 2.25
  dimension "d85" = 12
  dimension "d86" = 6
  dimension "d87" = 9
  dimension "d88" = 4.5
extrude "Extrusion1" add sketch "Sketch2" against normal blind 2.5 contours L13 L14 L15 L16 L17 L19 A0 L18 | A1 L50 A2 L49 | A3 L53 A4 L52
hole "Hole1" at (0, 0, 0) at (-16, 0, -233) at (16, 0, -233) at (29, 0, -120.6366) at (29, 0, -200.6366) at (-57.7903, 0, -118.3692) at (-9.5703, 0, -117.0692) at (-14.6503, 0, -169.1692) at (-42.5503, 0, -169.1692) direction (0, -1, 0) diameter 2.8956 depth 2.5 clearance for "Flat Head Machine Screw" size "M2.5" standard "Ansi Metric M Profile"
hole "Hole2" at (-57, 0, -215.6213) at (0, 0, -215) at (57, 0, -215.6213) direction (0, -1, 0) diameter 6.756 depth 2.5 clearance for "Flat Head Machine Screw (82)" size "1/4" standard "Ansi Unified Screw Threads"
hole "Jetson-only" at (-46, 0, -21.0659) at (-46, 0, -79.0659) at (40, 0, -79.0659) at (40, 0, -21.0659) direction (0, -1, 0) diameter 2.8956 depth 2.5 clearance for "Flat Head Machine Screw" size "M2.5" standard "Ansi Metric M Profile"
hole "Jetson + PCA 9685" [suppressed]
fillet "Fillet1" radius 10 8 edges at (-65, -1.25, -220.6213) (-20, -1.25, -237) (20, -1.25, -237) (65, -1.25, -220.6213) (65, -1.25, -3.0659) (6.5, -1.25, 0) (-6.5, -1.25, 0) (-65, -1.25, -3.0659)
extrude "Extrusion2" add sketch "Sketch2" along normal blind 2 contours A1 L50 A2 L49 | A3 L53 A4 L52
equation "\"d4\" = 0.5 * d0"
equation "\"d15\" = d14"
equation "\"d17\" = d18"
equation "\"d19\" = d17"
equation "\"d21\" = d20"
equation "\"d23\" = 0.5 * d21"
properties part number "chassis_plate_v7"
